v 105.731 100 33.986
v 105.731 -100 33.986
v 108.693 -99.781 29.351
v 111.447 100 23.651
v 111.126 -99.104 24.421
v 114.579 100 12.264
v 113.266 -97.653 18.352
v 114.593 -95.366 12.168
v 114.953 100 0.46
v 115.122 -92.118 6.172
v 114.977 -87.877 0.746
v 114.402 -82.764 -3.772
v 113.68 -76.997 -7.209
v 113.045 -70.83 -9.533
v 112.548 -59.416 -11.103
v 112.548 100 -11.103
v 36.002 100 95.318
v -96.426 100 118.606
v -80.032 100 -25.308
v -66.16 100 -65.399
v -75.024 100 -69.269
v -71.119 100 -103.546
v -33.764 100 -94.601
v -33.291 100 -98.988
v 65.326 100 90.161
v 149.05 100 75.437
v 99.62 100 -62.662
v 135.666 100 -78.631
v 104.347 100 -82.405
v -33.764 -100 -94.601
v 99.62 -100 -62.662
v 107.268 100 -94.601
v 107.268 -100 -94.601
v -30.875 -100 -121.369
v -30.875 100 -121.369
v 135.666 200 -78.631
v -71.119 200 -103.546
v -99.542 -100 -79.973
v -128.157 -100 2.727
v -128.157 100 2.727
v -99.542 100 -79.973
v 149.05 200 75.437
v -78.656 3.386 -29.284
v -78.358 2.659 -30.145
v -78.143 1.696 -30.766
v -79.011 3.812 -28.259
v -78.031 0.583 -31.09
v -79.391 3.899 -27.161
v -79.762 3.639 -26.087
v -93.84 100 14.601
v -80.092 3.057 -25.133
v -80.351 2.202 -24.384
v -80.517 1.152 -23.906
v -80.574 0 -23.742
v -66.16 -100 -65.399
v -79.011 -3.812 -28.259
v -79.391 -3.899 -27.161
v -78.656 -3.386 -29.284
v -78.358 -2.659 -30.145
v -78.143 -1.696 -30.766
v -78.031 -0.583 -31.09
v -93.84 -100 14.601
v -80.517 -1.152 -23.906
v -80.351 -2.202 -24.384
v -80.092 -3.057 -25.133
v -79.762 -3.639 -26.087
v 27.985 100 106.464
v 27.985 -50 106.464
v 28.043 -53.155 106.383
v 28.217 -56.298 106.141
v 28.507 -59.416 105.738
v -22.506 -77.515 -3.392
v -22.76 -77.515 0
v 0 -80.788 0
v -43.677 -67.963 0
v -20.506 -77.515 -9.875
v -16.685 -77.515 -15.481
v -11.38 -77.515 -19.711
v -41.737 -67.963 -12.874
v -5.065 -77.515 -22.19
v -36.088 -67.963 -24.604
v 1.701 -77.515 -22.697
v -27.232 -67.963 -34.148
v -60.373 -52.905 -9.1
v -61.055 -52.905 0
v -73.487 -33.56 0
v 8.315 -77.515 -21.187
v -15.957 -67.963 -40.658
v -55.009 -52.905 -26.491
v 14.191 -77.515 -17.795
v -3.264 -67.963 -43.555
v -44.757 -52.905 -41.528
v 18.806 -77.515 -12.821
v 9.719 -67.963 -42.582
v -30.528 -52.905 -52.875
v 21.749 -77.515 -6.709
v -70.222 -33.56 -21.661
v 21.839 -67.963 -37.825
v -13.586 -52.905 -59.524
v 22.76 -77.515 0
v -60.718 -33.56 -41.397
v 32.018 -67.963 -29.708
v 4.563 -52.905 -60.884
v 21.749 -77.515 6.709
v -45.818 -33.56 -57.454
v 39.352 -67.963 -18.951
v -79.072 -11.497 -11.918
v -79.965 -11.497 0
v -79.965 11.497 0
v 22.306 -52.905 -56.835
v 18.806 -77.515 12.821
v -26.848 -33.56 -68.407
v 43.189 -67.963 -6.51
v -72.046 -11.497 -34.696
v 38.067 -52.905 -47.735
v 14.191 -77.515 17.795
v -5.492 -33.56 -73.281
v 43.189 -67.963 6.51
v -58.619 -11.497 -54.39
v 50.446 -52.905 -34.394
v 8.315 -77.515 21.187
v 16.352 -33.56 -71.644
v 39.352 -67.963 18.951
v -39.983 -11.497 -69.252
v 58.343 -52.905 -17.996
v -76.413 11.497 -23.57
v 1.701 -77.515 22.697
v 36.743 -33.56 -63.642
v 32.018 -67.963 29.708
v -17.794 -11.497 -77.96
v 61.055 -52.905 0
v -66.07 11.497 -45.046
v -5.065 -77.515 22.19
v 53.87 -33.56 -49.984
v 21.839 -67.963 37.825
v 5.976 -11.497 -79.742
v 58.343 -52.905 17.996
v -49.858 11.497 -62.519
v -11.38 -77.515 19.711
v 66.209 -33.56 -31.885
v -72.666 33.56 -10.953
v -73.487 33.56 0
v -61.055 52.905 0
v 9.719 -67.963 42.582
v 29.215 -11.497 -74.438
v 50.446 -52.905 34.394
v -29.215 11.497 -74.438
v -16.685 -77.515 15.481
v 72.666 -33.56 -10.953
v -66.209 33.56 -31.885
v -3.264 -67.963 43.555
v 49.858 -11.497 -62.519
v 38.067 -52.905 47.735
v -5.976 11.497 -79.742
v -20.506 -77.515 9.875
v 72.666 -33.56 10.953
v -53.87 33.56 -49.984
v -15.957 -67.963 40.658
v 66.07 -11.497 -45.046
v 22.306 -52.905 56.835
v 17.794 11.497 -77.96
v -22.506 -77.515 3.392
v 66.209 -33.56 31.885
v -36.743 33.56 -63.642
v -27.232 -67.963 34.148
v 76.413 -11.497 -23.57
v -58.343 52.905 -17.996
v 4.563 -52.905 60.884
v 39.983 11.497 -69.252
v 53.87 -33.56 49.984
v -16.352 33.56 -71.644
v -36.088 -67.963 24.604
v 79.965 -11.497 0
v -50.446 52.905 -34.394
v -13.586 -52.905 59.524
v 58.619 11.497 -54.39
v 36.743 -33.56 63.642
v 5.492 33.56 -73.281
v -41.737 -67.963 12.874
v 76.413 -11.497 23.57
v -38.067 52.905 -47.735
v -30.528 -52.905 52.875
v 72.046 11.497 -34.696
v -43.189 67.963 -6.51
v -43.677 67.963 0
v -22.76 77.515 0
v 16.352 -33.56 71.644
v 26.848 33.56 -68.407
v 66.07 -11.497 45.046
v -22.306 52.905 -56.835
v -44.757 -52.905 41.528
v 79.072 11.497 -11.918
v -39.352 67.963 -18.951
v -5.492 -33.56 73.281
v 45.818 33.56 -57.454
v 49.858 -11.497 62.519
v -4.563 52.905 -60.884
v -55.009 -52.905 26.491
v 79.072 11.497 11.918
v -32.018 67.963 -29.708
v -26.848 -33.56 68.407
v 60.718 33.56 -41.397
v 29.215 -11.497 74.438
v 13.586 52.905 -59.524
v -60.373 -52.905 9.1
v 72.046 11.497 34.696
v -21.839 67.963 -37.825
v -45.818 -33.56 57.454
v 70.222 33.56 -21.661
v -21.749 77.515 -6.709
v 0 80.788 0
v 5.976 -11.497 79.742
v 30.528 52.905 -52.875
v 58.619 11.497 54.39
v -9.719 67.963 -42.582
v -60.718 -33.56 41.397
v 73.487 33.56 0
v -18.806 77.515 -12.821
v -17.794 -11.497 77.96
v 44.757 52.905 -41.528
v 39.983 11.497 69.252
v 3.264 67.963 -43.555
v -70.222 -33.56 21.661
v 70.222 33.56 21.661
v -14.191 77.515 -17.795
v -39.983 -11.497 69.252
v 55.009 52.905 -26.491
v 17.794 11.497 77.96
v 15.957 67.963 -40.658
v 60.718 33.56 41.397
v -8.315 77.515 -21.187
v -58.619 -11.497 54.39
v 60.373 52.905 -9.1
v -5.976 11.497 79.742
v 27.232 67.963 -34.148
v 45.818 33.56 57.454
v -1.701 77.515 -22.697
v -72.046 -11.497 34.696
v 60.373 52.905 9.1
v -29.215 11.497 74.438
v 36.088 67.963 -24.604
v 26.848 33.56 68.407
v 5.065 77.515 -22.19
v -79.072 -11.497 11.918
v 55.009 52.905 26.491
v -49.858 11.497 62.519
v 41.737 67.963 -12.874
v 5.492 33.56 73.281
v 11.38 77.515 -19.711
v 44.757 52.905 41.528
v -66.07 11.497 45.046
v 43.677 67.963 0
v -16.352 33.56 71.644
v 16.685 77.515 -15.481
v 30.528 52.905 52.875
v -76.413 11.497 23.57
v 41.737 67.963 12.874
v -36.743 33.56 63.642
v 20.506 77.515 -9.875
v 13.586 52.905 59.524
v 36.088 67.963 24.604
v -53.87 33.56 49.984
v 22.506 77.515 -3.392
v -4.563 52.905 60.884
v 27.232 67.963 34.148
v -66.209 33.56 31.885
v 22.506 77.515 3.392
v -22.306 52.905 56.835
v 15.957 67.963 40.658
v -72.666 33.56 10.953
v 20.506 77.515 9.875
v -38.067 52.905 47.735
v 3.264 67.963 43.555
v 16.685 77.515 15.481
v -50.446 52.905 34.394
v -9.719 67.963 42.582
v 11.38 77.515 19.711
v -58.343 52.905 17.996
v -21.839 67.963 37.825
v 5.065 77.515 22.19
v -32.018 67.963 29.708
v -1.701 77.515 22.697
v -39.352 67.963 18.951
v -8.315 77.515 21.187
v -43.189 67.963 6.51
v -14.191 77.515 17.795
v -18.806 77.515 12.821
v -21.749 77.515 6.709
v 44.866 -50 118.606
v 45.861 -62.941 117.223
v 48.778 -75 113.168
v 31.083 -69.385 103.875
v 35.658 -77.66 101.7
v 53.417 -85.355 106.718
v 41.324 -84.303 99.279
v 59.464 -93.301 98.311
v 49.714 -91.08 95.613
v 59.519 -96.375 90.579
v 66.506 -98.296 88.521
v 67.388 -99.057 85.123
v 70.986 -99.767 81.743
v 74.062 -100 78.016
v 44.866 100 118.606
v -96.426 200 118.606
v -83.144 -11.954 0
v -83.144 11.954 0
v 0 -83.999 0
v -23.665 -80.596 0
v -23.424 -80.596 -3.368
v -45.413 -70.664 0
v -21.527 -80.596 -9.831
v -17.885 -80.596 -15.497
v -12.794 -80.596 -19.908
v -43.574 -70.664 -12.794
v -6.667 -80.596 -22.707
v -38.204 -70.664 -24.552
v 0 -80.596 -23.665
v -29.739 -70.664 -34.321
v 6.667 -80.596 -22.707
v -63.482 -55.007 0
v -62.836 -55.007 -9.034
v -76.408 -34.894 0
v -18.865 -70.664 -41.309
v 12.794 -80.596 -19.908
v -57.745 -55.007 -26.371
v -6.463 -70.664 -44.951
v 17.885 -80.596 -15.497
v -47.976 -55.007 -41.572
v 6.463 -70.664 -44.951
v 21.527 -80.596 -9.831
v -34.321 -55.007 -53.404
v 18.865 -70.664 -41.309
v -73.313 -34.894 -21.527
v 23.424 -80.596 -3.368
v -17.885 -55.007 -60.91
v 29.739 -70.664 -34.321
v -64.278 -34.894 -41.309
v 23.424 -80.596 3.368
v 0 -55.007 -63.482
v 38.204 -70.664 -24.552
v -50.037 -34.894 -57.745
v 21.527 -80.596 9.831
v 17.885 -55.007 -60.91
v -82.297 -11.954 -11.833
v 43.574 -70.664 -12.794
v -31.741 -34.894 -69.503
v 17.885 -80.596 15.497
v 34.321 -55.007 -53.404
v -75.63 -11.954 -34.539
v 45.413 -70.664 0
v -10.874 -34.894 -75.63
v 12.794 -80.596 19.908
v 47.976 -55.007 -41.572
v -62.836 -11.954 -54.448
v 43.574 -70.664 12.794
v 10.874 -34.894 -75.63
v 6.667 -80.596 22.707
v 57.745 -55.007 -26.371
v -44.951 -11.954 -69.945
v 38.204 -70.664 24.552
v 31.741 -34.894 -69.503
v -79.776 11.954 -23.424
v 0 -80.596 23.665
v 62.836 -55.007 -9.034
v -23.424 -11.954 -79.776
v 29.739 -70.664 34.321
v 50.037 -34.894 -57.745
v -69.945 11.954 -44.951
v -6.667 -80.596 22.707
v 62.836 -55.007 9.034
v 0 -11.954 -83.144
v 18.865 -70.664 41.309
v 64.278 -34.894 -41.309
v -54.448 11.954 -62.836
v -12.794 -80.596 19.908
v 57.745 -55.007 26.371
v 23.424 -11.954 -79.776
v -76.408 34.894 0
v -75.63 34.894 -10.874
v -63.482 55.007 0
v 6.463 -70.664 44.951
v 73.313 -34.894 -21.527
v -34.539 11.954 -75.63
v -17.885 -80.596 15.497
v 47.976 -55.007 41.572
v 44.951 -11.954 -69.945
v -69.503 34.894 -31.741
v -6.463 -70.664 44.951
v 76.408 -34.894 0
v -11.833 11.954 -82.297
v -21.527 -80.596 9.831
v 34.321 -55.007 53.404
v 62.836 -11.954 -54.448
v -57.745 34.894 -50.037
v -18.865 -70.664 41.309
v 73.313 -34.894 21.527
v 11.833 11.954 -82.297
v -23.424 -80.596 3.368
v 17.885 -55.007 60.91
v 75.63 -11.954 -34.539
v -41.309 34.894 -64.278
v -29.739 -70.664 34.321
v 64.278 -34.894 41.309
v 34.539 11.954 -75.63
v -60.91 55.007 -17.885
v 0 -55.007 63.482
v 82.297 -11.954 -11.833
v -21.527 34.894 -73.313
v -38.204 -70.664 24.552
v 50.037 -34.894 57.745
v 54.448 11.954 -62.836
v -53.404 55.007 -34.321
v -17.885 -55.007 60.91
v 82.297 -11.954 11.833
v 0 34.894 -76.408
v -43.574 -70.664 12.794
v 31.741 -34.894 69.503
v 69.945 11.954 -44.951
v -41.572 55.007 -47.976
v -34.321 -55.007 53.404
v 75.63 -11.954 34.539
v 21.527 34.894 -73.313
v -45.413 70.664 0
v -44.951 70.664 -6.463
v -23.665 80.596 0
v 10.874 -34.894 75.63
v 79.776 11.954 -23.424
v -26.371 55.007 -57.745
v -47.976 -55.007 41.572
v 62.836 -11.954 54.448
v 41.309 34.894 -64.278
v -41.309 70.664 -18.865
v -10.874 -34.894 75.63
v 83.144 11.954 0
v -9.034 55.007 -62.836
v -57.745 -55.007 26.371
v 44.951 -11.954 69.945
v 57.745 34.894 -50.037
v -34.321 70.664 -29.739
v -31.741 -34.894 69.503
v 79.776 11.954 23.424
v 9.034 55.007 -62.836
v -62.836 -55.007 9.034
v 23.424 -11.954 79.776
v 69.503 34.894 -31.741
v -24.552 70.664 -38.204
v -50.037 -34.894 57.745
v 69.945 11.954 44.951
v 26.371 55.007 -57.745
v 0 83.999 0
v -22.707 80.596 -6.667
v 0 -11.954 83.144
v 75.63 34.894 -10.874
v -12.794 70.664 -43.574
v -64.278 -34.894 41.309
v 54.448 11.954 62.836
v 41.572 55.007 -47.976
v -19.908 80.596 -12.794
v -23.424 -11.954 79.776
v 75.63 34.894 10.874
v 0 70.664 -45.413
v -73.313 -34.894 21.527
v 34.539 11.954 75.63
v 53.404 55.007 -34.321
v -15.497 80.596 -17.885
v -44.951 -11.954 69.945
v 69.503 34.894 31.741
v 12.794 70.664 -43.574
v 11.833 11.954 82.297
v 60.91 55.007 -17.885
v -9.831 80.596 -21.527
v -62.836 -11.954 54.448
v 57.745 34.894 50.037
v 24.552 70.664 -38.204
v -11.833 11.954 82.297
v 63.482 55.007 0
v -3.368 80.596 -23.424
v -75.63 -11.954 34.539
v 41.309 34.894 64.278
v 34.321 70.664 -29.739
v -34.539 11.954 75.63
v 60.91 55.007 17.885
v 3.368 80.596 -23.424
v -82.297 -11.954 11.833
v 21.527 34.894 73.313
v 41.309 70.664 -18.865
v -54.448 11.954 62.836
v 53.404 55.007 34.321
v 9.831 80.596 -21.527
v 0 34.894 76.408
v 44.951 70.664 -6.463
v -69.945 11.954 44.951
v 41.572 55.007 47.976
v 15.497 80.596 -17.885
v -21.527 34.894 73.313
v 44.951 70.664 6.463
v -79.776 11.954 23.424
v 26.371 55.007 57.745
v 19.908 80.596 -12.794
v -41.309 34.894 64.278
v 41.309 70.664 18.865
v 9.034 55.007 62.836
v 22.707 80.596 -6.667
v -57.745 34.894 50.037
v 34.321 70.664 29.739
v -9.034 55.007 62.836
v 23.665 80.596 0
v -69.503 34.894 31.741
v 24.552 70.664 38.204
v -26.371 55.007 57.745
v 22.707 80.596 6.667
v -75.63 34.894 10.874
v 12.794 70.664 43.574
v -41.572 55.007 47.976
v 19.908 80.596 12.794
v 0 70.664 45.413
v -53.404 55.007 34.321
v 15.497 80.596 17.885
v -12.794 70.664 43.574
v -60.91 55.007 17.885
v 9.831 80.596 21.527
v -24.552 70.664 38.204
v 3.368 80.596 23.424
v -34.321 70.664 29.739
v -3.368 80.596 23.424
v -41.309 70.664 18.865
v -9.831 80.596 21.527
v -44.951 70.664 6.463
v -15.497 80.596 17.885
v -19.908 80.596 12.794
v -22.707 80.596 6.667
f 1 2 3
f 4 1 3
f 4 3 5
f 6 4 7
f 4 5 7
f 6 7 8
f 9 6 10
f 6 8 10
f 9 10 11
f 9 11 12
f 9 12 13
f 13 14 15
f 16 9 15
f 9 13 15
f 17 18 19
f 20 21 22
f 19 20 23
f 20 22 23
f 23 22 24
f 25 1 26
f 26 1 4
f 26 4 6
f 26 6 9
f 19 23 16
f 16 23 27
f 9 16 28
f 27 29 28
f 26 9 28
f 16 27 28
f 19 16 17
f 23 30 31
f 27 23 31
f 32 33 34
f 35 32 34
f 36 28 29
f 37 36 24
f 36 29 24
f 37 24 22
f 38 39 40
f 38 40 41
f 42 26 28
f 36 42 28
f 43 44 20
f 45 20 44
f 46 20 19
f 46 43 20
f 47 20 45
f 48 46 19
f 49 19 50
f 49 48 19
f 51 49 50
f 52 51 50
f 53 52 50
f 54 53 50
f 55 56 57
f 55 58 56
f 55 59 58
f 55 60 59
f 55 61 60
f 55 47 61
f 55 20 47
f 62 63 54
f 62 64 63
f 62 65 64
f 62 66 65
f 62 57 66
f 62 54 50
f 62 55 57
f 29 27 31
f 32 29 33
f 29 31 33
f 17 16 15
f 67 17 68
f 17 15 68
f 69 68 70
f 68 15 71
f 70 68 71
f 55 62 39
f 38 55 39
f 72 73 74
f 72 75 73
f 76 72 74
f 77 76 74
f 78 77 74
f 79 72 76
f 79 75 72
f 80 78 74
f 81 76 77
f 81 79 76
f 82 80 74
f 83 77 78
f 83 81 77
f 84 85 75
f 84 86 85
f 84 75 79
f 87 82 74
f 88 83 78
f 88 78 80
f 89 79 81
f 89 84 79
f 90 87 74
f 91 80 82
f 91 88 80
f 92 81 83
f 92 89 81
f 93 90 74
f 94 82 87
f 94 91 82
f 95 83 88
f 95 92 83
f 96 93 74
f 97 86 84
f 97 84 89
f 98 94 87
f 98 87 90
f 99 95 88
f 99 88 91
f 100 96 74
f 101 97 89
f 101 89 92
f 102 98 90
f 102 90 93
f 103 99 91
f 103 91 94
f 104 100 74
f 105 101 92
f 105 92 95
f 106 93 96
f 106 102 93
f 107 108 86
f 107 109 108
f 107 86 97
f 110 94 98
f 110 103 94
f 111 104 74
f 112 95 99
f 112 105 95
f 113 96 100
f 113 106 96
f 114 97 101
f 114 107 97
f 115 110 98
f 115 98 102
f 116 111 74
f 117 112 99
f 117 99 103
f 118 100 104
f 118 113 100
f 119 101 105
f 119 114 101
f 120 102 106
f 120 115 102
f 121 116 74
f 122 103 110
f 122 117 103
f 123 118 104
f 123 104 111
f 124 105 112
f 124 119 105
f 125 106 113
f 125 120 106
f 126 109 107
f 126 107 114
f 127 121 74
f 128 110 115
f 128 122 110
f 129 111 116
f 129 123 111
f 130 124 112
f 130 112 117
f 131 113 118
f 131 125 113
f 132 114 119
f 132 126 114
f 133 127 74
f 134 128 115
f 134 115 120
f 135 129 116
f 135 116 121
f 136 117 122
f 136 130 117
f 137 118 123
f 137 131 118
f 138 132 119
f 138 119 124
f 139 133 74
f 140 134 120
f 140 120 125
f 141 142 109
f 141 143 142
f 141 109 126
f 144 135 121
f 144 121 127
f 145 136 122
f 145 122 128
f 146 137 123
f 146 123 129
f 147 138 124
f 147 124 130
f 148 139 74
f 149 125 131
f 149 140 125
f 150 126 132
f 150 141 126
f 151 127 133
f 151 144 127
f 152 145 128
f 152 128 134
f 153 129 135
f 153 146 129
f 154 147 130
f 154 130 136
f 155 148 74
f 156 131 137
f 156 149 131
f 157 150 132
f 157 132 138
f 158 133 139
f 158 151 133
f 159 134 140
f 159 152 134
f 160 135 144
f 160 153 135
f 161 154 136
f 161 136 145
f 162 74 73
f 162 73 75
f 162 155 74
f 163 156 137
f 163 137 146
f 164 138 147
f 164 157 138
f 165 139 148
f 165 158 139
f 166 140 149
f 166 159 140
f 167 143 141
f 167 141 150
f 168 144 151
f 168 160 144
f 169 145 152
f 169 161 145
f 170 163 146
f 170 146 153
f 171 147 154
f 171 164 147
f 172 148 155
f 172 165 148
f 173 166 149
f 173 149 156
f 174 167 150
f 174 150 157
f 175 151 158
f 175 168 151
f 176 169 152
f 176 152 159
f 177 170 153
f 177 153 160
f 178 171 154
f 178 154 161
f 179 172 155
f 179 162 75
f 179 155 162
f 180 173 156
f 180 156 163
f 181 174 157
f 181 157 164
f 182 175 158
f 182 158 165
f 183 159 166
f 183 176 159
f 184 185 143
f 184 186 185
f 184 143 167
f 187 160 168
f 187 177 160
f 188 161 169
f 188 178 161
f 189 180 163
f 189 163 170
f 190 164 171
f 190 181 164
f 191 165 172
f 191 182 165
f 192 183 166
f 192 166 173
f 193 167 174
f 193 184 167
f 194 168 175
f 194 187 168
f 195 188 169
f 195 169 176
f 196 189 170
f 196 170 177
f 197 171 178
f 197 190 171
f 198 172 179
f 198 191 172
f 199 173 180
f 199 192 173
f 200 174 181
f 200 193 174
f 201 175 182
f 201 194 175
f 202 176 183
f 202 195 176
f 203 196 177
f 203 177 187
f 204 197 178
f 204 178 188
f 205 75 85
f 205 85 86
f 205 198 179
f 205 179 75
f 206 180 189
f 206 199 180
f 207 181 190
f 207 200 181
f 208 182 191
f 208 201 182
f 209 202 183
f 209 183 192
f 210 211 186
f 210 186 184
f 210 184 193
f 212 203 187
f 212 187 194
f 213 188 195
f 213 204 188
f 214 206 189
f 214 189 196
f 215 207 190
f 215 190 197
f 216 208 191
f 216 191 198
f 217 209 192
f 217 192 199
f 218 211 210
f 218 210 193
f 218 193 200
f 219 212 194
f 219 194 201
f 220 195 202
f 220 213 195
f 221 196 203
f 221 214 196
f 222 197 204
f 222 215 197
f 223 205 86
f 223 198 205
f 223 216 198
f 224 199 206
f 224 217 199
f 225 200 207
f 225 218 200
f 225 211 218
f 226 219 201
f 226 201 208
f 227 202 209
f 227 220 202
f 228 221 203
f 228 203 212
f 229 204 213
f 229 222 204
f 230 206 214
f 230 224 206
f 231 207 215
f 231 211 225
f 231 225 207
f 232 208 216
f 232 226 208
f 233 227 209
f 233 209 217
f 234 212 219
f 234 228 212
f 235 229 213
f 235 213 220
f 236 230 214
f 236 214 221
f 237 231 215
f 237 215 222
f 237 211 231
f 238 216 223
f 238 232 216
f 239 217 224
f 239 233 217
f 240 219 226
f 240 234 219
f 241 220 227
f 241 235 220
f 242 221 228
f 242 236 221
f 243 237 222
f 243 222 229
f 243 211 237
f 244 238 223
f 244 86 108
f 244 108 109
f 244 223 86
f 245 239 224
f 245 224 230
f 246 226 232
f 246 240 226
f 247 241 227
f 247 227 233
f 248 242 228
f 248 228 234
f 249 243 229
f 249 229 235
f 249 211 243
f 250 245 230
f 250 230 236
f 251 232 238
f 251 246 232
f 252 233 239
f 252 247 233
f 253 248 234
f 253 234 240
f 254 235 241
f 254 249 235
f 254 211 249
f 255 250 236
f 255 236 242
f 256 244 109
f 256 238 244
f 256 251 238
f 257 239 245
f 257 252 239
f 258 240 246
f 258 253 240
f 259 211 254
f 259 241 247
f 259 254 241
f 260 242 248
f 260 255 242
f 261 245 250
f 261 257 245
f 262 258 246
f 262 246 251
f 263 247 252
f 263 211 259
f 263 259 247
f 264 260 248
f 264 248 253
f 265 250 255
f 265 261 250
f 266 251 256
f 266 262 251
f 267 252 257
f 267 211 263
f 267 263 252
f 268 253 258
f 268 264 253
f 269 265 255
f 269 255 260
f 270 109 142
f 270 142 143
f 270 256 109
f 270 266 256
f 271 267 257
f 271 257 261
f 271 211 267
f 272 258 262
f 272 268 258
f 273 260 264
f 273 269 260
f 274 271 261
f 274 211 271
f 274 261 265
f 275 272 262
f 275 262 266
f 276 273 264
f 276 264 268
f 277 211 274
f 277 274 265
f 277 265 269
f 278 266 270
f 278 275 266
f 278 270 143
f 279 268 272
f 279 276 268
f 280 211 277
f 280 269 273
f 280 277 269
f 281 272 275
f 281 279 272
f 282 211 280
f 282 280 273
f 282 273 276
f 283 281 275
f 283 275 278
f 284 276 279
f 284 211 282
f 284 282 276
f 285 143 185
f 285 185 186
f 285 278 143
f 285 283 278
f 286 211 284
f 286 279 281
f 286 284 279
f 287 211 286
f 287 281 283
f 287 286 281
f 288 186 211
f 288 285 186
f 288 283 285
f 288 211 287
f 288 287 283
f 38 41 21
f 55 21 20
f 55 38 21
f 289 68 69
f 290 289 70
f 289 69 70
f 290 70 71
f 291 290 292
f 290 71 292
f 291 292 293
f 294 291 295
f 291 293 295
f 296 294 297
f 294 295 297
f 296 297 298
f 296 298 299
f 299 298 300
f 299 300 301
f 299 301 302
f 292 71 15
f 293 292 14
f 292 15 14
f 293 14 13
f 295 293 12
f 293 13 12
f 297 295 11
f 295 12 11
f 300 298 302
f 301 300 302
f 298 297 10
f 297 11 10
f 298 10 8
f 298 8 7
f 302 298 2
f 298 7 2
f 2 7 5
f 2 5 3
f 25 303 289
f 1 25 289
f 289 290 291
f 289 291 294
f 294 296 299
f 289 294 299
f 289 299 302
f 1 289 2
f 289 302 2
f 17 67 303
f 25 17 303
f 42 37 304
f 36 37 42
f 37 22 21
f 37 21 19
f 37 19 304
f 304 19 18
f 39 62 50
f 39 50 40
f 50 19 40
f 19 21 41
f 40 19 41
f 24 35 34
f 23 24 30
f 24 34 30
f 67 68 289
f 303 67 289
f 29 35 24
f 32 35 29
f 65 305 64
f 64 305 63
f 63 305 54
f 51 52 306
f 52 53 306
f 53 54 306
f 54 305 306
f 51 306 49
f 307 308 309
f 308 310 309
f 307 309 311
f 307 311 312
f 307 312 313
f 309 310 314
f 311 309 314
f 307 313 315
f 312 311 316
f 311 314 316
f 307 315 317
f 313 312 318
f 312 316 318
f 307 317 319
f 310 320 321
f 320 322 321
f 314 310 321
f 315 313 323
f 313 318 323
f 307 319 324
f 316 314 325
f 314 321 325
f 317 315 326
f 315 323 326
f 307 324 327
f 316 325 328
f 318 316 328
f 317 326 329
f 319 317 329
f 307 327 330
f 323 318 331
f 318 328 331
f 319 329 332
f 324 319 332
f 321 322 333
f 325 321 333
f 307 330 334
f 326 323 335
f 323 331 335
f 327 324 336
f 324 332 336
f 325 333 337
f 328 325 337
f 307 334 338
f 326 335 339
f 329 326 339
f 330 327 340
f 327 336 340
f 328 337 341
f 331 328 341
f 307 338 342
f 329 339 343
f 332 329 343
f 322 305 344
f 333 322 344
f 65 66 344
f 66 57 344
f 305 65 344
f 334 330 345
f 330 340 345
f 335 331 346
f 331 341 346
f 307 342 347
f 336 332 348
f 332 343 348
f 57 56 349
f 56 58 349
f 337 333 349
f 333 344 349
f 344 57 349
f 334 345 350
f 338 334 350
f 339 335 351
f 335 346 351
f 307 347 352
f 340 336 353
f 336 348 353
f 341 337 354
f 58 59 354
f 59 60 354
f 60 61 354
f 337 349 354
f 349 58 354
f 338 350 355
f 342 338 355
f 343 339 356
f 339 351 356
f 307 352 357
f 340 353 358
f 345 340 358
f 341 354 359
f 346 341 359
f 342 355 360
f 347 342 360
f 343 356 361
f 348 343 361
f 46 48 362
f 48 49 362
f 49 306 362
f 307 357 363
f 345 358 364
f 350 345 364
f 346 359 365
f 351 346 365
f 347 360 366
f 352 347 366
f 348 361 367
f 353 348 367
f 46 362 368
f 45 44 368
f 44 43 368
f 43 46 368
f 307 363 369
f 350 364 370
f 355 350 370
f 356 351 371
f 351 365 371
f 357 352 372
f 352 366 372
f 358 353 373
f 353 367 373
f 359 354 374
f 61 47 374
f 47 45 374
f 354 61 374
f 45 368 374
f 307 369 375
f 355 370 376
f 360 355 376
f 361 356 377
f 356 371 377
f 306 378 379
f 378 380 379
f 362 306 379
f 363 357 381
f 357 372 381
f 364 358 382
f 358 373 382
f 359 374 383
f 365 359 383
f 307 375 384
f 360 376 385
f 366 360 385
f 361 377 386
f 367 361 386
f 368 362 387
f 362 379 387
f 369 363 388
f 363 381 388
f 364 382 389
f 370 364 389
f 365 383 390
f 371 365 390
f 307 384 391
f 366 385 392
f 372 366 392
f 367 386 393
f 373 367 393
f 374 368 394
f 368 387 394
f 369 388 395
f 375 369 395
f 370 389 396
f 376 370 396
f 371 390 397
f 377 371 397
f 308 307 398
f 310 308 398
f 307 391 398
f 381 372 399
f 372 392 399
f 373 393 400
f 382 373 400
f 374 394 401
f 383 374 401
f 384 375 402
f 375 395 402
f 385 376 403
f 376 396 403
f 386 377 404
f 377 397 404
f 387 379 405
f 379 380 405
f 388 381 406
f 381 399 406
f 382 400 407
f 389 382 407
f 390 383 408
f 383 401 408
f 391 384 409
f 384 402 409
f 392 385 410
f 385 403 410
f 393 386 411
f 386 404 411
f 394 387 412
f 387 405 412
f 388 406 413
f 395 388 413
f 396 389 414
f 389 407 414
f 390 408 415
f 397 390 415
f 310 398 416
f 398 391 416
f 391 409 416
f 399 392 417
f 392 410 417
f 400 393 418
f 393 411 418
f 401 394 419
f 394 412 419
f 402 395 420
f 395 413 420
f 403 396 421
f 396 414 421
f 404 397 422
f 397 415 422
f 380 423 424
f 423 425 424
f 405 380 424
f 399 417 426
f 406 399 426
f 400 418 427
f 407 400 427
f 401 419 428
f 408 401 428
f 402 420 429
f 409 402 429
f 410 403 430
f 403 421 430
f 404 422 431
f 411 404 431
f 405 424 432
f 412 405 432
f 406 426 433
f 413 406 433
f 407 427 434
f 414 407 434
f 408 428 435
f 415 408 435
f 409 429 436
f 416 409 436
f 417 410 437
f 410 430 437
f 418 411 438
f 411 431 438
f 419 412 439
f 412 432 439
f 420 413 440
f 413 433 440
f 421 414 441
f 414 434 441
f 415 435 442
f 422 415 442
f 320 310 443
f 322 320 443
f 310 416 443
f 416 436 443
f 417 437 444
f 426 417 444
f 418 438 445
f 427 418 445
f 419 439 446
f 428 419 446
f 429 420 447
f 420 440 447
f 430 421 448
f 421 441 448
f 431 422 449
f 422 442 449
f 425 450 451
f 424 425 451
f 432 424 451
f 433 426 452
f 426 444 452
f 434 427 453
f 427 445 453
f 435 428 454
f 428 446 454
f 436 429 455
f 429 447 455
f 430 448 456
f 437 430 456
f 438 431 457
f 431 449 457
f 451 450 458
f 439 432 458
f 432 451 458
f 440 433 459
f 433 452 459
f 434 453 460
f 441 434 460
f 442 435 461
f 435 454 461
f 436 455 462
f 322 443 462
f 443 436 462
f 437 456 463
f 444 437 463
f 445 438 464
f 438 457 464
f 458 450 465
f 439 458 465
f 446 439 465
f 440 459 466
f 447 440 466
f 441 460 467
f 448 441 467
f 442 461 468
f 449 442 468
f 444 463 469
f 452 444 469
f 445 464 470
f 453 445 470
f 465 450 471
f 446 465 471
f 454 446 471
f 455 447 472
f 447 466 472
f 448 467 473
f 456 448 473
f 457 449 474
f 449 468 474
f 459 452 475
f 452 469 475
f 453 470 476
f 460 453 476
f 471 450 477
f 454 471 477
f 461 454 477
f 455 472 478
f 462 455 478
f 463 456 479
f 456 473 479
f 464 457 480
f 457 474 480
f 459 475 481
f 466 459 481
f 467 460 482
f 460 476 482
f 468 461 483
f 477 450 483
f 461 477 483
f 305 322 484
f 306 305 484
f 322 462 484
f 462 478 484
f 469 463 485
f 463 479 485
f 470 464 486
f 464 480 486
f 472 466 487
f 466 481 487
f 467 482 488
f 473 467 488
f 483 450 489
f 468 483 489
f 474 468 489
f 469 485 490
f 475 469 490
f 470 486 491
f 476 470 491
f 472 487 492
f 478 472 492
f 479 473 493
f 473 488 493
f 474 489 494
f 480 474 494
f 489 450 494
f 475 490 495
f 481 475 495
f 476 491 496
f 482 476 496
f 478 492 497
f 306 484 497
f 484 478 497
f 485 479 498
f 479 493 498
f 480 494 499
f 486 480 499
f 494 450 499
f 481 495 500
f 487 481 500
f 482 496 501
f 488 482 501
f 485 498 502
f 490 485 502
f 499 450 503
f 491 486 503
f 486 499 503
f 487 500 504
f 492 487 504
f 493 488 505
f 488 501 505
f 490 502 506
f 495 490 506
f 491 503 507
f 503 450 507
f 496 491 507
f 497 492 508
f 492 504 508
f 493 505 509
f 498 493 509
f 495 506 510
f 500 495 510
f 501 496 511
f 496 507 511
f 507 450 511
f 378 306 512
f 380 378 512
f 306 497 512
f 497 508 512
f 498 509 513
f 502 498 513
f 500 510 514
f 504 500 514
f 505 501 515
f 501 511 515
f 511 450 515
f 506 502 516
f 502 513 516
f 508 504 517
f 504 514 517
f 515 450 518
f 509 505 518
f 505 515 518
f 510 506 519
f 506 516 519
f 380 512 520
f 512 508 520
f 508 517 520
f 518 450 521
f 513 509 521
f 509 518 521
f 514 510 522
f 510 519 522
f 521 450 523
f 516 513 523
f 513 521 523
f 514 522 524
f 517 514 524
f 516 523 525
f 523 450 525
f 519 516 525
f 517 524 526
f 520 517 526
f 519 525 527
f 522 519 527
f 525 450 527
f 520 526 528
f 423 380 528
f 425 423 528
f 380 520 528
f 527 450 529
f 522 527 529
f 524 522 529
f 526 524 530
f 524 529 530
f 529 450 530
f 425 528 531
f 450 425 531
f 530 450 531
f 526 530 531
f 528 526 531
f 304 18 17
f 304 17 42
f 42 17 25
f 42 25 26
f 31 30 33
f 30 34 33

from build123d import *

# Parameters (mm, degrees)
BOSS_EXTRUDE1_START = -100
BOSS_EXTRUDE1_DEPTH = 200
BOSS_EXTRUDE2_START = 100
BOSS_EXTRUDE2_DEPTH = 100
FILLET4_R           = 50
FILLET5_R           = 50


with BuildPart() as part:
    # Sketch2 → Revolve1 (revolve)
    with BuildSketch(Plane.XY):
        with BuildLine():
            Line((0, 83.99866675223616), (0, -83.99866675223616))
            ThreePointArc((0, -83.99866675223616), (-83.99866675223616, 1.029e-14), (0, 83.99866675223616))
        make_face()
    revolve(axis=Axis((0, 83.99866675223616, 0), (0, -1, 0)))

    # Sketch3 → Cut-Revolve1 (revolve, cut)
    with BuildSketch(Plane.XY):
        with BuildLine():
            Line((0, 80.78753047196574), (0, -80.78753047196574))
            ThreePointArc((0, -80.78753047196574), (-80.78753047196574, 9.89e-15), (0, 80.78753047196574))
        make_face()
    revolve(axis=Axis((0, 80.78753047196574, 0), (0, -1, 0)), mode=Mode.SUBTRACT)

    # Sketch4 → Boss-Extrude1 (add)
    with BuildSketch(Plane(origin=(0, 0, 0), x_dir=(1, 0, 0), z_dir=(0, 1, 0)).offset(BOSS_EXTRUDE1_START)):
        Polygon((112.54766400764188, 11.102674962916051), (27.984824564062315, -106.46400649371546), (44.86622080796269, -118.60638205853901), (131.25655362126273, 1.5010410793763536), align=None)
        Polygon((-33.76429920229263, 94.6008743415586), (99.61989179054804, 62.66167239344396), (107.26781928097456, 94.6008743415586), (-30.8745618831775, 121.36896740283562), align=None)
        Polygon((-66.15977546395177, 65.39931827471092), (-93.84041715231778, -14.600778033423827), (-128.15679158223395, -2.7270515196505585), (-99.54190589937616, 79.97311259674068), align=None)
    extrude(amount=BOSS_EXTRUDE1_DEPTH)


with BuildPart() as boss_extrude1_piece_1:
    # of the separate pieces the step leaves, piece 1, a body of its own (boss_extrude1_pieces)
    add(part.part.solids().sort_by_distance((0, -83.998666752, 0))[0])



with BuildPart() as boss_extrude1_piece_2:
    # of the separate pieces the step leaves, piece 2, a body of its own (boss_extrude1_pieces)
    add(part.part.solids().sort_by_distance((-33.764299202, -100, -94.600874342))[0])


with BuildPart() as boss_extrude1_piece_3:
    # of the separate pieces the step leaves, piece 3, a body of its own (boss_extrude1_pieces)
    add(part.part.solids().sort_by_distance((112.547664008, -100, -11.102674963))[0])


with BuildPart() as boss_extrude1_piece_1_1:
    add(boss_extrude1_piece_1.part)

    add(boss_extrude1_piece_2.part)  # Boss-Extrude2 merges Boss-Extrude1 piece 2

    add(boss_extrude1_piece_3.part)  # Boss-Extrude2 merges Boss-Extrude1 piece 3
    # Sketch4<3> → Boss-Extrude2 (add)
    with BuildSketch(Plane(origin=(0, 0, 0), x_dir=(1, 0, 0), z_dir=(0, 1, 0)).offset(BOSS_EXTRUDE2_START)):
        Polygon((-71.1192338079553, 103.5456135287754), (-96.42597159573657, -118.60638205853901), (149.04960909120163, -75.4373531726898), (135.6655625605631, 78.63127336750127), align=None)
    extrude(amount=BOSS_EXTRUDE2_DEPTH)

    # Fillet4
    # the kernel refuses this fillet: 50 mm, written as the material it takes off along each edge
    with BuildSketch(Plane(origin=(-73.49181604435654, -100, 33.47434002763414), x_dir=(2e-16, 1, -2.8e-16), z_dir=(0.8118131248673509, 0, 0.5839173317286507))) as fillet4_piece_1:
        with BuildLine():
            CenterArc((FILLET4_R, -FILLET4_R), FILLET4_R, 90.00000000000003, 89.99999999999997)
            Line((1.73e-14, -FILLET4_R), (-FILLET4_R * 0.02, -FILLET4_R))
            Line((-FILLET4_R * 0.02, -FILLET4_R), (-FILLET4_R * 0.02, FILLET4_R * 0.02))
            Line((-FILLET4_R * 0.02, FILLET4_R * 0.02), (FILLET4_R, FILLET4_R * 0.02))
            Line((FILLET4_R, FILLET4_R * 0.02), (FILLET4_R, 0))
        make_face()
    extrude(amount=270.79468257754365, mode=Mode.SUBTRACT)
    with BuildSketch(Plane(origin=(171.7917074692354, -100, -93.46894402013166), x_dir=(0, 1, 0), z_dir=(-0.5839173317286501, 0, 0.8118131248673512))) as fillet4_piece_2:
        with BuildLine():
            CenterArc((40.583856818365355, -50), FILLET4_R, 90, 54.26011731322143)
            Line((0, -20.794682577543853), (-0.8116771363673081, -20.21057622909473))
            ThreePointArc((-0.8116771363673081, -20.21057622909473), (-1, -10.397341288771914), (-1, -6.48e-15))
            Line((-1, -6.48e-15), (0, 1.0000000000000047))
            Line((0, 1.0000000000000047), (40.583856818365355, 0.9999999999999881))
            Line((40.583856818365355, 0.9999999999999881), (40.583856818365355, 0))
        make_face()
    extrude(amount=347.739166716712, mode=Mode.SUBTRACT)

    # Fillet5
    # the kernel refuses this fillet: 50 mm, written as the material it takes off along each edge
    with BuildSketch(Plane(origin=(131.25655362126273, -209.28392328582004, -1.50104107937635), x_dir=(-0.8896758585741418, 0, -0.4565926704080605), z_dir=(0, 1, 0))) as fillet5_piece_1:
        with BuildLine():
            CenterArc((55.94900253333829, 35.785265930590285), FILLET5_R, 171.4409151223373, 54.26011731322126)
            Line((6.5058569003557185, 43.22672747491594), (5.516993987696065, 43.37555670580245))
            Line((5.516993987696065, 43.37555670580245), (-0.9888629126596437, 0.1488292308865173))
            Line((-0.9888629126596437, 0.1488292308865173), (-9.07e-15, -1.0000000000000053))
            ThreePointArc((-9.07e-15, -1.0000000000000053), (10.514441542566455, -0.9999999999999917), (20.330480696168753, -0.7157053186118065))
            Line((20.330480696168753, -0.7157053186118065), (21.02888308513286, 9.6e-16))
        make_face()
    extrude(amount=309.28392328582004, mode=Mode.SUBTRACT)


solid = boss_extrude1_piece_1_1.part
